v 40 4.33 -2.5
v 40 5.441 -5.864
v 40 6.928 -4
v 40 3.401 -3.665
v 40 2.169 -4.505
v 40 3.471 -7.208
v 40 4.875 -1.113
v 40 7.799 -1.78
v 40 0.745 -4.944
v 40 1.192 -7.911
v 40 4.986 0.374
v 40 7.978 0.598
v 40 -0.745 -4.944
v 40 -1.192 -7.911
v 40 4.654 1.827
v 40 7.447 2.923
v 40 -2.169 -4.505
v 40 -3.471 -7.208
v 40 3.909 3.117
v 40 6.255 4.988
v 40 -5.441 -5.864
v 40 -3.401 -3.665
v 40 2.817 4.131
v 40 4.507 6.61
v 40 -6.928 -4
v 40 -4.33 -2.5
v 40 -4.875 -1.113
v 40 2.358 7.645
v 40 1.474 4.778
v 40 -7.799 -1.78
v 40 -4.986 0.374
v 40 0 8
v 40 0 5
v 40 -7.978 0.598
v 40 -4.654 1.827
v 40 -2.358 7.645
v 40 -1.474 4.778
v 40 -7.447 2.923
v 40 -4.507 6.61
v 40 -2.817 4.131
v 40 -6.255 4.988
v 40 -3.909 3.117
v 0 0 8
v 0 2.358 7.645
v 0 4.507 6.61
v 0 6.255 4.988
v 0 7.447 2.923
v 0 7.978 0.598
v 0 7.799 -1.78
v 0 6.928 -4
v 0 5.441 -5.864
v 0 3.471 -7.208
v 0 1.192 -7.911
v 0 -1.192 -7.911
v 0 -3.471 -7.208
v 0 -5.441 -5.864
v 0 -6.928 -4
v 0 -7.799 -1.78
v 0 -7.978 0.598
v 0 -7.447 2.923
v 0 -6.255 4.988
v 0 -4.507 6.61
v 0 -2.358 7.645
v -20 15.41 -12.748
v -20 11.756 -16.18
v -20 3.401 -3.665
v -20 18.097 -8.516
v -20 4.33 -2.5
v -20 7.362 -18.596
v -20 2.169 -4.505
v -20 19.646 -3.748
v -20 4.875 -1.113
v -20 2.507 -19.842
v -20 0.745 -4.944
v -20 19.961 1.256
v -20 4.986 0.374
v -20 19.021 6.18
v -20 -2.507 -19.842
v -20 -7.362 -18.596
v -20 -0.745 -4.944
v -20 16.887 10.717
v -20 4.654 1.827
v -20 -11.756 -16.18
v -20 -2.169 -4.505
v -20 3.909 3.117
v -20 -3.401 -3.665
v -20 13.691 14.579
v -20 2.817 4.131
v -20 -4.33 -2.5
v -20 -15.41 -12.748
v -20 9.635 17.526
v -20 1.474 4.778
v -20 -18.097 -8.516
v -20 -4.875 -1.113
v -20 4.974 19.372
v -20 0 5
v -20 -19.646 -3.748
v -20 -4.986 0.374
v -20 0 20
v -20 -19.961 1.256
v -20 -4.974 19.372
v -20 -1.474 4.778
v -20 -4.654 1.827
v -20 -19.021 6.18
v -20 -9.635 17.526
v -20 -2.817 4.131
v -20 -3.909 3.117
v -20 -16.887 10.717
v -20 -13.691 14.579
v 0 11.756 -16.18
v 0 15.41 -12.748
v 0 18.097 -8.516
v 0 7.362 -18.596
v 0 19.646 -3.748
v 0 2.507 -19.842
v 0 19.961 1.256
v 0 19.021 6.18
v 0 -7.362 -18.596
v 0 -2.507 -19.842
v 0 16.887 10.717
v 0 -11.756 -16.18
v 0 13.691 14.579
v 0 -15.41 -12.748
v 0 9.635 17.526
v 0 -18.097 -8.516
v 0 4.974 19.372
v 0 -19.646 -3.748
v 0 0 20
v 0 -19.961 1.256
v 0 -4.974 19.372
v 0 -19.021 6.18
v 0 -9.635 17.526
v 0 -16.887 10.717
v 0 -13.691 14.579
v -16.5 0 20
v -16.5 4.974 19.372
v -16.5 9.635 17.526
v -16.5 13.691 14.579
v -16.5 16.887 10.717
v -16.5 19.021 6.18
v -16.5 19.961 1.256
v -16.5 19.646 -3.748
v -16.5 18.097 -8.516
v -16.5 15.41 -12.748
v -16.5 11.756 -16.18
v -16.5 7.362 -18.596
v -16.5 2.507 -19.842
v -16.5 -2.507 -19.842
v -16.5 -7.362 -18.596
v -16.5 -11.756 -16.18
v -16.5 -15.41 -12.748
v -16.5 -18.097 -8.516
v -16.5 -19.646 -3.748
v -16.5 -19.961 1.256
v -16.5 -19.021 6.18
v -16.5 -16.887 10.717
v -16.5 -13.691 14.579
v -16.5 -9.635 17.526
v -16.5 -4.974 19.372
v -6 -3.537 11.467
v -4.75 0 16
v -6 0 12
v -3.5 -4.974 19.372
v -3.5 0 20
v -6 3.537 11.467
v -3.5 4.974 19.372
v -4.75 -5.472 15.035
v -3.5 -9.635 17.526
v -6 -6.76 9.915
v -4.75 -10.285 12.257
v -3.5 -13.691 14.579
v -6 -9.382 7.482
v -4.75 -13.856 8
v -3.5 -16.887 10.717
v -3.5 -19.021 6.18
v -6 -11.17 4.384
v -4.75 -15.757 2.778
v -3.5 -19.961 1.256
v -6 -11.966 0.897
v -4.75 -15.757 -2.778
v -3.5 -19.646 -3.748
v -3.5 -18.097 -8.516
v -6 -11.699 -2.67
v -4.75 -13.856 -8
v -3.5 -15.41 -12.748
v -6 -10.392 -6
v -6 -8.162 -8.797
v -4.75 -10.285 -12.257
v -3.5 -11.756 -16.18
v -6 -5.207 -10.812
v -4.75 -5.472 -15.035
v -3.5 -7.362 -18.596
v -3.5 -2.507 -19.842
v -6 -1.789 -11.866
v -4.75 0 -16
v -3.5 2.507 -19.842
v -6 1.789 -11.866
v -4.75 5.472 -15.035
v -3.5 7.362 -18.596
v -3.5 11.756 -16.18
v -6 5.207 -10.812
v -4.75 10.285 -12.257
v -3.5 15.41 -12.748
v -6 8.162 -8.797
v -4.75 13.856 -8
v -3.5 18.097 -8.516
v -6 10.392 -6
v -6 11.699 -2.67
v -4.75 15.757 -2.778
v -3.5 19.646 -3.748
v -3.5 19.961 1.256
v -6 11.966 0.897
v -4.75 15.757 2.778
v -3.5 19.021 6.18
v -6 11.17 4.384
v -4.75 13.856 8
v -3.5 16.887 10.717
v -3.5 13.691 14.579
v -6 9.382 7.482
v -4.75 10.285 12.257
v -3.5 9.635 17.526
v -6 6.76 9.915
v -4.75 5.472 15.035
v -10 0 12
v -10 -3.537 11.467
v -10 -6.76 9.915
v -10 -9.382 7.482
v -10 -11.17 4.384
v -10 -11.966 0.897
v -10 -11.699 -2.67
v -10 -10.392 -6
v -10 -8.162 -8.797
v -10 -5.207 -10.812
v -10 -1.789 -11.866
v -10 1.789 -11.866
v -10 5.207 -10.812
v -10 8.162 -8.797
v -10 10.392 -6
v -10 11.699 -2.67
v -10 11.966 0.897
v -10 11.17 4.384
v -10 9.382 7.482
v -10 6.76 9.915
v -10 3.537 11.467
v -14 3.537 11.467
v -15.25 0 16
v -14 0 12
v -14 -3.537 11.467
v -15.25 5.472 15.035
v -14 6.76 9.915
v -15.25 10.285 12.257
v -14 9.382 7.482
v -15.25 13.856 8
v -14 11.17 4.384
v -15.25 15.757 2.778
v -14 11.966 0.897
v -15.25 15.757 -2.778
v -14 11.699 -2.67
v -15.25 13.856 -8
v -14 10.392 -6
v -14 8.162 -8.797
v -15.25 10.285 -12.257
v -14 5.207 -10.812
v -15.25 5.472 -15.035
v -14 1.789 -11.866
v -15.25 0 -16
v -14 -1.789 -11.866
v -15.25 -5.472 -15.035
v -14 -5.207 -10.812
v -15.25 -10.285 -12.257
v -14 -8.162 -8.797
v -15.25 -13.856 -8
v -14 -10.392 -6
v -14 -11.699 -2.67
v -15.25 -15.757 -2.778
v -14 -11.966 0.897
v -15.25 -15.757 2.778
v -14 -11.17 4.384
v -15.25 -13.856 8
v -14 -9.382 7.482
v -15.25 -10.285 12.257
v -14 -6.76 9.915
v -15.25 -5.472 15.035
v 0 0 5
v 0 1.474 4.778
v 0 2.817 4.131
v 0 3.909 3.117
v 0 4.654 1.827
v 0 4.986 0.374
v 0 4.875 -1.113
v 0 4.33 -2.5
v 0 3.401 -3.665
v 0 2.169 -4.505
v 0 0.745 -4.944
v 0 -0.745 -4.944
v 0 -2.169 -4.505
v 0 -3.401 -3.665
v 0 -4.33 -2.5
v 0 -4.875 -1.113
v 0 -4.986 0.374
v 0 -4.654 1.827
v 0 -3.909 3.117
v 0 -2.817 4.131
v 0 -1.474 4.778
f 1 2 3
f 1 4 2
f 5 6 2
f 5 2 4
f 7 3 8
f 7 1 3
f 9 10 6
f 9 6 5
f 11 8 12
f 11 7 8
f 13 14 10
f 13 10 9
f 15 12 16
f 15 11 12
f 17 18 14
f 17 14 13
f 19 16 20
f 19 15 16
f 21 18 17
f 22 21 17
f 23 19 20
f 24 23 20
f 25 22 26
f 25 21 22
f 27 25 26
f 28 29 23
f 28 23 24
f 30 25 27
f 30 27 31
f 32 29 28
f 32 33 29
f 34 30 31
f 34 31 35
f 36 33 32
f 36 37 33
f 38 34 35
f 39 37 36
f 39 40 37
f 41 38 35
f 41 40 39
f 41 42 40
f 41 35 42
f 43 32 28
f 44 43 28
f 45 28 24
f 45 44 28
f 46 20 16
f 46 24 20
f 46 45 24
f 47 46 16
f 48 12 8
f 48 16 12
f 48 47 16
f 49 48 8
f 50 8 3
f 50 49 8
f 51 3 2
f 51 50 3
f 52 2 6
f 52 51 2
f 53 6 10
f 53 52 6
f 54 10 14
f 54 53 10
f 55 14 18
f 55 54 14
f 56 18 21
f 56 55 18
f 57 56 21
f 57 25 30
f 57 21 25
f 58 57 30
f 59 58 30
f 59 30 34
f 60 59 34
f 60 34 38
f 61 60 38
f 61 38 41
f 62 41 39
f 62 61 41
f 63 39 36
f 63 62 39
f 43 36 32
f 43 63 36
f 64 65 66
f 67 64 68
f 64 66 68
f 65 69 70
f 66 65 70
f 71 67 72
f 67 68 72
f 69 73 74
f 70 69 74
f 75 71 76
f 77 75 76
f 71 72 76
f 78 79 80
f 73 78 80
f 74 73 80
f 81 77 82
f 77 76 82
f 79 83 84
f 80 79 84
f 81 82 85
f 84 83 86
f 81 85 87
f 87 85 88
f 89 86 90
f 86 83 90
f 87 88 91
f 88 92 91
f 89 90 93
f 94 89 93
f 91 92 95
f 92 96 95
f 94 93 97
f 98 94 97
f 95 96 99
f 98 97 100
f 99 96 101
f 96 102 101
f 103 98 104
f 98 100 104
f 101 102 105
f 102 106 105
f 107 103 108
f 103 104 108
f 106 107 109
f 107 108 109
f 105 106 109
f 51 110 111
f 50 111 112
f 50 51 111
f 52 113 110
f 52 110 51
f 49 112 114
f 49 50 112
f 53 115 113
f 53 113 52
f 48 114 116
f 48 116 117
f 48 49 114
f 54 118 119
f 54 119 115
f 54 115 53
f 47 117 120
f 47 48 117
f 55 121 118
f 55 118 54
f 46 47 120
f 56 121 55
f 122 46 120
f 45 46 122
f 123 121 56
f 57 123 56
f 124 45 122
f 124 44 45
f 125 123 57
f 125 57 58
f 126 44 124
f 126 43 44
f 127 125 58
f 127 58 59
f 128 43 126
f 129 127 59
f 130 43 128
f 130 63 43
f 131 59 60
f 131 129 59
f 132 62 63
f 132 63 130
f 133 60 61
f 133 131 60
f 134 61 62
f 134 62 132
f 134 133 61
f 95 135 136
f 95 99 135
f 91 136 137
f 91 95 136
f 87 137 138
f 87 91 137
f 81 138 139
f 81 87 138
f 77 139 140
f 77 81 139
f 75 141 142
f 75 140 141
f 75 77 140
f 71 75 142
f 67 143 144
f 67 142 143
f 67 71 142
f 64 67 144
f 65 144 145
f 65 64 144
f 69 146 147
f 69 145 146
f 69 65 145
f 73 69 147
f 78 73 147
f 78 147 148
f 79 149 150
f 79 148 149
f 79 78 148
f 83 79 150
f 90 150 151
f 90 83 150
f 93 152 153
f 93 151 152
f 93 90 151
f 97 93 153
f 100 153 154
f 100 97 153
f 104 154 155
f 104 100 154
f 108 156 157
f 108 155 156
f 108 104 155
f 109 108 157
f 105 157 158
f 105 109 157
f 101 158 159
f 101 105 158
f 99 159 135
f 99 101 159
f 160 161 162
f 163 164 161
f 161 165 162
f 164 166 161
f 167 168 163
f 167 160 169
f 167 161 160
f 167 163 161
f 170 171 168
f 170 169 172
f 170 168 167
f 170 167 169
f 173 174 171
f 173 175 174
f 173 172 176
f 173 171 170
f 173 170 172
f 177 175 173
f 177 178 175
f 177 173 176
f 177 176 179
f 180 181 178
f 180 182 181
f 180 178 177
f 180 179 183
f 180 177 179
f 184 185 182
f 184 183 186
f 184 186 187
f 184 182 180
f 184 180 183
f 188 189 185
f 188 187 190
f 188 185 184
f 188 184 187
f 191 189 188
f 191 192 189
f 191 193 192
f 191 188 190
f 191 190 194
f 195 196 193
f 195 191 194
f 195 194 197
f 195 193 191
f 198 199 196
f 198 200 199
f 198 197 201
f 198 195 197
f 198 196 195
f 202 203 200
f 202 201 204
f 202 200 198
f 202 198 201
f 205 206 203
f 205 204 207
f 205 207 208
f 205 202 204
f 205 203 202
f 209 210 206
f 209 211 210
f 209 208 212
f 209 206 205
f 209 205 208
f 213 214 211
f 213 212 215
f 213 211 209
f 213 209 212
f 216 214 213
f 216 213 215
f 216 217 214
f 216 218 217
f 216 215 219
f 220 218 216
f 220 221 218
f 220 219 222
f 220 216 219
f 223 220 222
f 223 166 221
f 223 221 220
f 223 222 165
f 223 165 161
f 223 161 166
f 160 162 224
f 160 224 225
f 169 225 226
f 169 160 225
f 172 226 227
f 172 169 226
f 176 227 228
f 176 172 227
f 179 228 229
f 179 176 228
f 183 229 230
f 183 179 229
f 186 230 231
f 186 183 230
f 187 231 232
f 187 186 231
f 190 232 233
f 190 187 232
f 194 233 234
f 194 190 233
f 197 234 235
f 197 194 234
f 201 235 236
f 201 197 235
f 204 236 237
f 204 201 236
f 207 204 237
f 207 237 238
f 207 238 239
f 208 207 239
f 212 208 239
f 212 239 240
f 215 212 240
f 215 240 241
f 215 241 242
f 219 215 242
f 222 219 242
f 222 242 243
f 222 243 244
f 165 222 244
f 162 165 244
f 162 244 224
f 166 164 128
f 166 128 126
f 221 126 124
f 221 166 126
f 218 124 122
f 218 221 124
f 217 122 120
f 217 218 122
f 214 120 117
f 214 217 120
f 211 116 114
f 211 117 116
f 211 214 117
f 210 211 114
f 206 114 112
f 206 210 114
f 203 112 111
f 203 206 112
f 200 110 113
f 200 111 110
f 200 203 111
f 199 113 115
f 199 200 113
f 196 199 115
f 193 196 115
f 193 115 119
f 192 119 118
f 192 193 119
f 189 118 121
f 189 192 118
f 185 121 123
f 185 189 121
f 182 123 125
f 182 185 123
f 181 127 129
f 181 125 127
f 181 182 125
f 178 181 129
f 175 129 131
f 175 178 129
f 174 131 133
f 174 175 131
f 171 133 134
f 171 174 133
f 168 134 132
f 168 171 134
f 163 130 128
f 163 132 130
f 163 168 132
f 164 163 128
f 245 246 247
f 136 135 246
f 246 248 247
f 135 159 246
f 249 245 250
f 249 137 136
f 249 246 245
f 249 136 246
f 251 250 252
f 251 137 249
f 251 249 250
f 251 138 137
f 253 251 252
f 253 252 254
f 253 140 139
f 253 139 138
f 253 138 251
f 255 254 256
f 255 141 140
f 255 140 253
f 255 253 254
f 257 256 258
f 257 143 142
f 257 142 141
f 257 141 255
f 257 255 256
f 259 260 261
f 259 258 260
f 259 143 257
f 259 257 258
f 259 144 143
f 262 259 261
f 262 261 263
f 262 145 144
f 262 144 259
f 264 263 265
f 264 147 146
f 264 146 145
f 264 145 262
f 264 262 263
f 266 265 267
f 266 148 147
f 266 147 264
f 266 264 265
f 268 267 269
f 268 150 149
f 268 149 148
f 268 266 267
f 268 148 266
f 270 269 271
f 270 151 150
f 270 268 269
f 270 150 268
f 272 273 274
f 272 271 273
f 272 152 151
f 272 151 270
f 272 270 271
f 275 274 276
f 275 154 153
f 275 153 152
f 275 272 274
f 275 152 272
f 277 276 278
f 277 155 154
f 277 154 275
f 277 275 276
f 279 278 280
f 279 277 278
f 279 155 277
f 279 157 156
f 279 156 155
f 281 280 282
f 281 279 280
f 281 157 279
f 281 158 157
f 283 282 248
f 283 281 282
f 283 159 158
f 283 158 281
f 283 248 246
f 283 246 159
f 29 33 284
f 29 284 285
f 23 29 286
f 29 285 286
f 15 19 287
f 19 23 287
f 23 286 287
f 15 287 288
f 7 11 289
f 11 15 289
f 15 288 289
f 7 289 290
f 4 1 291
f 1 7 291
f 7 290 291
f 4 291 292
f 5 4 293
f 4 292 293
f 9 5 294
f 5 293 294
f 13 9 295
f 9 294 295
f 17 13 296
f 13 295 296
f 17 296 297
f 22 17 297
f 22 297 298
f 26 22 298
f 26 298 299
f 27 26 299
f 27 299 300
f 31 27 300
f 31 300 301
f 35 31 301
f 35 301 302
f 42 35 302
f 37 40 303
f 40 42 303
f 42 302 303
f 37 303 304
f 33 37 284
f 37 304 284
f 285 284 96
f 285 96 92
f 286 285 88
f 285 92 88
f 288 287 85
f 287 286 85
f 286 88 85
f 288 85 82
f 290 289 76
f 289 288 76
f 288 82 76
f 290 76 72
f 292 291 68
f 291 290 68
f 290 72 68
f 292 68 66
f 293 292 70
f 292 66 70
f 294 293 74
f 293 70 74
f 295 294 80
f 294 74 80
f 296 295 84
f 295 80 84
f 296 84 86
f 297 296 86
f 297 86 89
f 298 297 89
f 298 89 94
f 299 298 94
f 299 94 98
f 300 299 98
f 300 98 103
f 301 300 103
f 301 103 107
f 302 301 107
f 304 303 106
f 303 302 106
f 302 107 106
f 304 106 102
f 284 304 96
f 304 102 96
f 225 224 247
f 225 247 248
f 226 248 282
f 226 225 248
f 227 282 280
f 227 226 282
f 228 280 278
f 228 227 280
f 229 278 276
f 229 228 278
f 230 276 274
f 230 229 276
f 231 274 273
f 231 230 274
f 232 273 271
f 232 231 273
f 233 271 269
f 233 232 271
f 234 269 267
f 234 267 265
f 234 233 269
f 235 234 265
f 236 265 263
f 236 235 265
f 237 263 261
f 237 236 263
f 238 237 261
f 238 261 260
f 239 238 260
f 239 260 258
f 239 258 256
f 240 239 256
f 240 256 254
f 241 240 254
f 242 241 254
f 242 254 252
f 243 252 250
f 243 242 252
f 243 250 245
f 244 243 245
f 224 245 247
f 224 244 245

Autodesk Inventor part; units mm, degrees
ref_plane "YZ Plane" through (0, 0, 0) normal (1, 0, 0) x (0, 1, 0)
ref_plane "XZ Plane" through (0, 0, 0) normal (0, 1, 0) x (-1, 0, 0)
ref_plane "XY Plane" through (0, 0, 0) normal (0, 0, 1) x (1, 0, 0)
sketch "Эскиз1" plane through (0, 0, 0) normal (0, 1, 0) x (-1, 0, 0)
  line L0 (0, 20) -> (20, 20)
  line L1 (20, 20) -> (20, 0)
  line L2 (20, 0) -> (0, 0)
  line L3 (20, 20) -> (14, 20)
  line L4 (14, 20) -> (14, 12)
  line L5 (14, 12) -> (6, 12)
  line L6 (6, 12) -> (6, 20)
  line L7 (20, 0) -> (-40, 0)
  line L8 (-40, 0) -> (-40, 8)
  line L9 (-40, 8) -> (0, 8)
  line L10 (-40, 0) -> (-40, 5)
  line L11 (-40, 5) -> (20, 5)
  line L12 (0, 0) -> (0, 5)
  line L13 (0, 8) -> (0, 20)
  line L14 (10, 12) -> (10, 20)
  line L15 (10, 20) -> (3.5, 20)
  line L16 (3.5, 20) -> (6, 12)
  line L17 (3.5, 20) -> (16.5, 20)
  line L18 (16.5, 20) -> (14, 12)
  dimension "d0" = 20
  dimension "d1" = 20
  dimension "d2" = 6
  dimension "d3" = 8
  dimension "d4" = 8
  dimension "d5" = 60
  dimension "d6" = 8
  dimension "d7" = 5
  dimension "d15" = 6.5
  dimension "d16" = 13
revolve "Вращение1" add sketch "Эскиз1" angle 360 about axis through (-20, 0, 0) along (1, 0, 0) contours L0 L16 L5 L18 L1 L11 L8 L9 L13
properties part number "Шкив 20"
